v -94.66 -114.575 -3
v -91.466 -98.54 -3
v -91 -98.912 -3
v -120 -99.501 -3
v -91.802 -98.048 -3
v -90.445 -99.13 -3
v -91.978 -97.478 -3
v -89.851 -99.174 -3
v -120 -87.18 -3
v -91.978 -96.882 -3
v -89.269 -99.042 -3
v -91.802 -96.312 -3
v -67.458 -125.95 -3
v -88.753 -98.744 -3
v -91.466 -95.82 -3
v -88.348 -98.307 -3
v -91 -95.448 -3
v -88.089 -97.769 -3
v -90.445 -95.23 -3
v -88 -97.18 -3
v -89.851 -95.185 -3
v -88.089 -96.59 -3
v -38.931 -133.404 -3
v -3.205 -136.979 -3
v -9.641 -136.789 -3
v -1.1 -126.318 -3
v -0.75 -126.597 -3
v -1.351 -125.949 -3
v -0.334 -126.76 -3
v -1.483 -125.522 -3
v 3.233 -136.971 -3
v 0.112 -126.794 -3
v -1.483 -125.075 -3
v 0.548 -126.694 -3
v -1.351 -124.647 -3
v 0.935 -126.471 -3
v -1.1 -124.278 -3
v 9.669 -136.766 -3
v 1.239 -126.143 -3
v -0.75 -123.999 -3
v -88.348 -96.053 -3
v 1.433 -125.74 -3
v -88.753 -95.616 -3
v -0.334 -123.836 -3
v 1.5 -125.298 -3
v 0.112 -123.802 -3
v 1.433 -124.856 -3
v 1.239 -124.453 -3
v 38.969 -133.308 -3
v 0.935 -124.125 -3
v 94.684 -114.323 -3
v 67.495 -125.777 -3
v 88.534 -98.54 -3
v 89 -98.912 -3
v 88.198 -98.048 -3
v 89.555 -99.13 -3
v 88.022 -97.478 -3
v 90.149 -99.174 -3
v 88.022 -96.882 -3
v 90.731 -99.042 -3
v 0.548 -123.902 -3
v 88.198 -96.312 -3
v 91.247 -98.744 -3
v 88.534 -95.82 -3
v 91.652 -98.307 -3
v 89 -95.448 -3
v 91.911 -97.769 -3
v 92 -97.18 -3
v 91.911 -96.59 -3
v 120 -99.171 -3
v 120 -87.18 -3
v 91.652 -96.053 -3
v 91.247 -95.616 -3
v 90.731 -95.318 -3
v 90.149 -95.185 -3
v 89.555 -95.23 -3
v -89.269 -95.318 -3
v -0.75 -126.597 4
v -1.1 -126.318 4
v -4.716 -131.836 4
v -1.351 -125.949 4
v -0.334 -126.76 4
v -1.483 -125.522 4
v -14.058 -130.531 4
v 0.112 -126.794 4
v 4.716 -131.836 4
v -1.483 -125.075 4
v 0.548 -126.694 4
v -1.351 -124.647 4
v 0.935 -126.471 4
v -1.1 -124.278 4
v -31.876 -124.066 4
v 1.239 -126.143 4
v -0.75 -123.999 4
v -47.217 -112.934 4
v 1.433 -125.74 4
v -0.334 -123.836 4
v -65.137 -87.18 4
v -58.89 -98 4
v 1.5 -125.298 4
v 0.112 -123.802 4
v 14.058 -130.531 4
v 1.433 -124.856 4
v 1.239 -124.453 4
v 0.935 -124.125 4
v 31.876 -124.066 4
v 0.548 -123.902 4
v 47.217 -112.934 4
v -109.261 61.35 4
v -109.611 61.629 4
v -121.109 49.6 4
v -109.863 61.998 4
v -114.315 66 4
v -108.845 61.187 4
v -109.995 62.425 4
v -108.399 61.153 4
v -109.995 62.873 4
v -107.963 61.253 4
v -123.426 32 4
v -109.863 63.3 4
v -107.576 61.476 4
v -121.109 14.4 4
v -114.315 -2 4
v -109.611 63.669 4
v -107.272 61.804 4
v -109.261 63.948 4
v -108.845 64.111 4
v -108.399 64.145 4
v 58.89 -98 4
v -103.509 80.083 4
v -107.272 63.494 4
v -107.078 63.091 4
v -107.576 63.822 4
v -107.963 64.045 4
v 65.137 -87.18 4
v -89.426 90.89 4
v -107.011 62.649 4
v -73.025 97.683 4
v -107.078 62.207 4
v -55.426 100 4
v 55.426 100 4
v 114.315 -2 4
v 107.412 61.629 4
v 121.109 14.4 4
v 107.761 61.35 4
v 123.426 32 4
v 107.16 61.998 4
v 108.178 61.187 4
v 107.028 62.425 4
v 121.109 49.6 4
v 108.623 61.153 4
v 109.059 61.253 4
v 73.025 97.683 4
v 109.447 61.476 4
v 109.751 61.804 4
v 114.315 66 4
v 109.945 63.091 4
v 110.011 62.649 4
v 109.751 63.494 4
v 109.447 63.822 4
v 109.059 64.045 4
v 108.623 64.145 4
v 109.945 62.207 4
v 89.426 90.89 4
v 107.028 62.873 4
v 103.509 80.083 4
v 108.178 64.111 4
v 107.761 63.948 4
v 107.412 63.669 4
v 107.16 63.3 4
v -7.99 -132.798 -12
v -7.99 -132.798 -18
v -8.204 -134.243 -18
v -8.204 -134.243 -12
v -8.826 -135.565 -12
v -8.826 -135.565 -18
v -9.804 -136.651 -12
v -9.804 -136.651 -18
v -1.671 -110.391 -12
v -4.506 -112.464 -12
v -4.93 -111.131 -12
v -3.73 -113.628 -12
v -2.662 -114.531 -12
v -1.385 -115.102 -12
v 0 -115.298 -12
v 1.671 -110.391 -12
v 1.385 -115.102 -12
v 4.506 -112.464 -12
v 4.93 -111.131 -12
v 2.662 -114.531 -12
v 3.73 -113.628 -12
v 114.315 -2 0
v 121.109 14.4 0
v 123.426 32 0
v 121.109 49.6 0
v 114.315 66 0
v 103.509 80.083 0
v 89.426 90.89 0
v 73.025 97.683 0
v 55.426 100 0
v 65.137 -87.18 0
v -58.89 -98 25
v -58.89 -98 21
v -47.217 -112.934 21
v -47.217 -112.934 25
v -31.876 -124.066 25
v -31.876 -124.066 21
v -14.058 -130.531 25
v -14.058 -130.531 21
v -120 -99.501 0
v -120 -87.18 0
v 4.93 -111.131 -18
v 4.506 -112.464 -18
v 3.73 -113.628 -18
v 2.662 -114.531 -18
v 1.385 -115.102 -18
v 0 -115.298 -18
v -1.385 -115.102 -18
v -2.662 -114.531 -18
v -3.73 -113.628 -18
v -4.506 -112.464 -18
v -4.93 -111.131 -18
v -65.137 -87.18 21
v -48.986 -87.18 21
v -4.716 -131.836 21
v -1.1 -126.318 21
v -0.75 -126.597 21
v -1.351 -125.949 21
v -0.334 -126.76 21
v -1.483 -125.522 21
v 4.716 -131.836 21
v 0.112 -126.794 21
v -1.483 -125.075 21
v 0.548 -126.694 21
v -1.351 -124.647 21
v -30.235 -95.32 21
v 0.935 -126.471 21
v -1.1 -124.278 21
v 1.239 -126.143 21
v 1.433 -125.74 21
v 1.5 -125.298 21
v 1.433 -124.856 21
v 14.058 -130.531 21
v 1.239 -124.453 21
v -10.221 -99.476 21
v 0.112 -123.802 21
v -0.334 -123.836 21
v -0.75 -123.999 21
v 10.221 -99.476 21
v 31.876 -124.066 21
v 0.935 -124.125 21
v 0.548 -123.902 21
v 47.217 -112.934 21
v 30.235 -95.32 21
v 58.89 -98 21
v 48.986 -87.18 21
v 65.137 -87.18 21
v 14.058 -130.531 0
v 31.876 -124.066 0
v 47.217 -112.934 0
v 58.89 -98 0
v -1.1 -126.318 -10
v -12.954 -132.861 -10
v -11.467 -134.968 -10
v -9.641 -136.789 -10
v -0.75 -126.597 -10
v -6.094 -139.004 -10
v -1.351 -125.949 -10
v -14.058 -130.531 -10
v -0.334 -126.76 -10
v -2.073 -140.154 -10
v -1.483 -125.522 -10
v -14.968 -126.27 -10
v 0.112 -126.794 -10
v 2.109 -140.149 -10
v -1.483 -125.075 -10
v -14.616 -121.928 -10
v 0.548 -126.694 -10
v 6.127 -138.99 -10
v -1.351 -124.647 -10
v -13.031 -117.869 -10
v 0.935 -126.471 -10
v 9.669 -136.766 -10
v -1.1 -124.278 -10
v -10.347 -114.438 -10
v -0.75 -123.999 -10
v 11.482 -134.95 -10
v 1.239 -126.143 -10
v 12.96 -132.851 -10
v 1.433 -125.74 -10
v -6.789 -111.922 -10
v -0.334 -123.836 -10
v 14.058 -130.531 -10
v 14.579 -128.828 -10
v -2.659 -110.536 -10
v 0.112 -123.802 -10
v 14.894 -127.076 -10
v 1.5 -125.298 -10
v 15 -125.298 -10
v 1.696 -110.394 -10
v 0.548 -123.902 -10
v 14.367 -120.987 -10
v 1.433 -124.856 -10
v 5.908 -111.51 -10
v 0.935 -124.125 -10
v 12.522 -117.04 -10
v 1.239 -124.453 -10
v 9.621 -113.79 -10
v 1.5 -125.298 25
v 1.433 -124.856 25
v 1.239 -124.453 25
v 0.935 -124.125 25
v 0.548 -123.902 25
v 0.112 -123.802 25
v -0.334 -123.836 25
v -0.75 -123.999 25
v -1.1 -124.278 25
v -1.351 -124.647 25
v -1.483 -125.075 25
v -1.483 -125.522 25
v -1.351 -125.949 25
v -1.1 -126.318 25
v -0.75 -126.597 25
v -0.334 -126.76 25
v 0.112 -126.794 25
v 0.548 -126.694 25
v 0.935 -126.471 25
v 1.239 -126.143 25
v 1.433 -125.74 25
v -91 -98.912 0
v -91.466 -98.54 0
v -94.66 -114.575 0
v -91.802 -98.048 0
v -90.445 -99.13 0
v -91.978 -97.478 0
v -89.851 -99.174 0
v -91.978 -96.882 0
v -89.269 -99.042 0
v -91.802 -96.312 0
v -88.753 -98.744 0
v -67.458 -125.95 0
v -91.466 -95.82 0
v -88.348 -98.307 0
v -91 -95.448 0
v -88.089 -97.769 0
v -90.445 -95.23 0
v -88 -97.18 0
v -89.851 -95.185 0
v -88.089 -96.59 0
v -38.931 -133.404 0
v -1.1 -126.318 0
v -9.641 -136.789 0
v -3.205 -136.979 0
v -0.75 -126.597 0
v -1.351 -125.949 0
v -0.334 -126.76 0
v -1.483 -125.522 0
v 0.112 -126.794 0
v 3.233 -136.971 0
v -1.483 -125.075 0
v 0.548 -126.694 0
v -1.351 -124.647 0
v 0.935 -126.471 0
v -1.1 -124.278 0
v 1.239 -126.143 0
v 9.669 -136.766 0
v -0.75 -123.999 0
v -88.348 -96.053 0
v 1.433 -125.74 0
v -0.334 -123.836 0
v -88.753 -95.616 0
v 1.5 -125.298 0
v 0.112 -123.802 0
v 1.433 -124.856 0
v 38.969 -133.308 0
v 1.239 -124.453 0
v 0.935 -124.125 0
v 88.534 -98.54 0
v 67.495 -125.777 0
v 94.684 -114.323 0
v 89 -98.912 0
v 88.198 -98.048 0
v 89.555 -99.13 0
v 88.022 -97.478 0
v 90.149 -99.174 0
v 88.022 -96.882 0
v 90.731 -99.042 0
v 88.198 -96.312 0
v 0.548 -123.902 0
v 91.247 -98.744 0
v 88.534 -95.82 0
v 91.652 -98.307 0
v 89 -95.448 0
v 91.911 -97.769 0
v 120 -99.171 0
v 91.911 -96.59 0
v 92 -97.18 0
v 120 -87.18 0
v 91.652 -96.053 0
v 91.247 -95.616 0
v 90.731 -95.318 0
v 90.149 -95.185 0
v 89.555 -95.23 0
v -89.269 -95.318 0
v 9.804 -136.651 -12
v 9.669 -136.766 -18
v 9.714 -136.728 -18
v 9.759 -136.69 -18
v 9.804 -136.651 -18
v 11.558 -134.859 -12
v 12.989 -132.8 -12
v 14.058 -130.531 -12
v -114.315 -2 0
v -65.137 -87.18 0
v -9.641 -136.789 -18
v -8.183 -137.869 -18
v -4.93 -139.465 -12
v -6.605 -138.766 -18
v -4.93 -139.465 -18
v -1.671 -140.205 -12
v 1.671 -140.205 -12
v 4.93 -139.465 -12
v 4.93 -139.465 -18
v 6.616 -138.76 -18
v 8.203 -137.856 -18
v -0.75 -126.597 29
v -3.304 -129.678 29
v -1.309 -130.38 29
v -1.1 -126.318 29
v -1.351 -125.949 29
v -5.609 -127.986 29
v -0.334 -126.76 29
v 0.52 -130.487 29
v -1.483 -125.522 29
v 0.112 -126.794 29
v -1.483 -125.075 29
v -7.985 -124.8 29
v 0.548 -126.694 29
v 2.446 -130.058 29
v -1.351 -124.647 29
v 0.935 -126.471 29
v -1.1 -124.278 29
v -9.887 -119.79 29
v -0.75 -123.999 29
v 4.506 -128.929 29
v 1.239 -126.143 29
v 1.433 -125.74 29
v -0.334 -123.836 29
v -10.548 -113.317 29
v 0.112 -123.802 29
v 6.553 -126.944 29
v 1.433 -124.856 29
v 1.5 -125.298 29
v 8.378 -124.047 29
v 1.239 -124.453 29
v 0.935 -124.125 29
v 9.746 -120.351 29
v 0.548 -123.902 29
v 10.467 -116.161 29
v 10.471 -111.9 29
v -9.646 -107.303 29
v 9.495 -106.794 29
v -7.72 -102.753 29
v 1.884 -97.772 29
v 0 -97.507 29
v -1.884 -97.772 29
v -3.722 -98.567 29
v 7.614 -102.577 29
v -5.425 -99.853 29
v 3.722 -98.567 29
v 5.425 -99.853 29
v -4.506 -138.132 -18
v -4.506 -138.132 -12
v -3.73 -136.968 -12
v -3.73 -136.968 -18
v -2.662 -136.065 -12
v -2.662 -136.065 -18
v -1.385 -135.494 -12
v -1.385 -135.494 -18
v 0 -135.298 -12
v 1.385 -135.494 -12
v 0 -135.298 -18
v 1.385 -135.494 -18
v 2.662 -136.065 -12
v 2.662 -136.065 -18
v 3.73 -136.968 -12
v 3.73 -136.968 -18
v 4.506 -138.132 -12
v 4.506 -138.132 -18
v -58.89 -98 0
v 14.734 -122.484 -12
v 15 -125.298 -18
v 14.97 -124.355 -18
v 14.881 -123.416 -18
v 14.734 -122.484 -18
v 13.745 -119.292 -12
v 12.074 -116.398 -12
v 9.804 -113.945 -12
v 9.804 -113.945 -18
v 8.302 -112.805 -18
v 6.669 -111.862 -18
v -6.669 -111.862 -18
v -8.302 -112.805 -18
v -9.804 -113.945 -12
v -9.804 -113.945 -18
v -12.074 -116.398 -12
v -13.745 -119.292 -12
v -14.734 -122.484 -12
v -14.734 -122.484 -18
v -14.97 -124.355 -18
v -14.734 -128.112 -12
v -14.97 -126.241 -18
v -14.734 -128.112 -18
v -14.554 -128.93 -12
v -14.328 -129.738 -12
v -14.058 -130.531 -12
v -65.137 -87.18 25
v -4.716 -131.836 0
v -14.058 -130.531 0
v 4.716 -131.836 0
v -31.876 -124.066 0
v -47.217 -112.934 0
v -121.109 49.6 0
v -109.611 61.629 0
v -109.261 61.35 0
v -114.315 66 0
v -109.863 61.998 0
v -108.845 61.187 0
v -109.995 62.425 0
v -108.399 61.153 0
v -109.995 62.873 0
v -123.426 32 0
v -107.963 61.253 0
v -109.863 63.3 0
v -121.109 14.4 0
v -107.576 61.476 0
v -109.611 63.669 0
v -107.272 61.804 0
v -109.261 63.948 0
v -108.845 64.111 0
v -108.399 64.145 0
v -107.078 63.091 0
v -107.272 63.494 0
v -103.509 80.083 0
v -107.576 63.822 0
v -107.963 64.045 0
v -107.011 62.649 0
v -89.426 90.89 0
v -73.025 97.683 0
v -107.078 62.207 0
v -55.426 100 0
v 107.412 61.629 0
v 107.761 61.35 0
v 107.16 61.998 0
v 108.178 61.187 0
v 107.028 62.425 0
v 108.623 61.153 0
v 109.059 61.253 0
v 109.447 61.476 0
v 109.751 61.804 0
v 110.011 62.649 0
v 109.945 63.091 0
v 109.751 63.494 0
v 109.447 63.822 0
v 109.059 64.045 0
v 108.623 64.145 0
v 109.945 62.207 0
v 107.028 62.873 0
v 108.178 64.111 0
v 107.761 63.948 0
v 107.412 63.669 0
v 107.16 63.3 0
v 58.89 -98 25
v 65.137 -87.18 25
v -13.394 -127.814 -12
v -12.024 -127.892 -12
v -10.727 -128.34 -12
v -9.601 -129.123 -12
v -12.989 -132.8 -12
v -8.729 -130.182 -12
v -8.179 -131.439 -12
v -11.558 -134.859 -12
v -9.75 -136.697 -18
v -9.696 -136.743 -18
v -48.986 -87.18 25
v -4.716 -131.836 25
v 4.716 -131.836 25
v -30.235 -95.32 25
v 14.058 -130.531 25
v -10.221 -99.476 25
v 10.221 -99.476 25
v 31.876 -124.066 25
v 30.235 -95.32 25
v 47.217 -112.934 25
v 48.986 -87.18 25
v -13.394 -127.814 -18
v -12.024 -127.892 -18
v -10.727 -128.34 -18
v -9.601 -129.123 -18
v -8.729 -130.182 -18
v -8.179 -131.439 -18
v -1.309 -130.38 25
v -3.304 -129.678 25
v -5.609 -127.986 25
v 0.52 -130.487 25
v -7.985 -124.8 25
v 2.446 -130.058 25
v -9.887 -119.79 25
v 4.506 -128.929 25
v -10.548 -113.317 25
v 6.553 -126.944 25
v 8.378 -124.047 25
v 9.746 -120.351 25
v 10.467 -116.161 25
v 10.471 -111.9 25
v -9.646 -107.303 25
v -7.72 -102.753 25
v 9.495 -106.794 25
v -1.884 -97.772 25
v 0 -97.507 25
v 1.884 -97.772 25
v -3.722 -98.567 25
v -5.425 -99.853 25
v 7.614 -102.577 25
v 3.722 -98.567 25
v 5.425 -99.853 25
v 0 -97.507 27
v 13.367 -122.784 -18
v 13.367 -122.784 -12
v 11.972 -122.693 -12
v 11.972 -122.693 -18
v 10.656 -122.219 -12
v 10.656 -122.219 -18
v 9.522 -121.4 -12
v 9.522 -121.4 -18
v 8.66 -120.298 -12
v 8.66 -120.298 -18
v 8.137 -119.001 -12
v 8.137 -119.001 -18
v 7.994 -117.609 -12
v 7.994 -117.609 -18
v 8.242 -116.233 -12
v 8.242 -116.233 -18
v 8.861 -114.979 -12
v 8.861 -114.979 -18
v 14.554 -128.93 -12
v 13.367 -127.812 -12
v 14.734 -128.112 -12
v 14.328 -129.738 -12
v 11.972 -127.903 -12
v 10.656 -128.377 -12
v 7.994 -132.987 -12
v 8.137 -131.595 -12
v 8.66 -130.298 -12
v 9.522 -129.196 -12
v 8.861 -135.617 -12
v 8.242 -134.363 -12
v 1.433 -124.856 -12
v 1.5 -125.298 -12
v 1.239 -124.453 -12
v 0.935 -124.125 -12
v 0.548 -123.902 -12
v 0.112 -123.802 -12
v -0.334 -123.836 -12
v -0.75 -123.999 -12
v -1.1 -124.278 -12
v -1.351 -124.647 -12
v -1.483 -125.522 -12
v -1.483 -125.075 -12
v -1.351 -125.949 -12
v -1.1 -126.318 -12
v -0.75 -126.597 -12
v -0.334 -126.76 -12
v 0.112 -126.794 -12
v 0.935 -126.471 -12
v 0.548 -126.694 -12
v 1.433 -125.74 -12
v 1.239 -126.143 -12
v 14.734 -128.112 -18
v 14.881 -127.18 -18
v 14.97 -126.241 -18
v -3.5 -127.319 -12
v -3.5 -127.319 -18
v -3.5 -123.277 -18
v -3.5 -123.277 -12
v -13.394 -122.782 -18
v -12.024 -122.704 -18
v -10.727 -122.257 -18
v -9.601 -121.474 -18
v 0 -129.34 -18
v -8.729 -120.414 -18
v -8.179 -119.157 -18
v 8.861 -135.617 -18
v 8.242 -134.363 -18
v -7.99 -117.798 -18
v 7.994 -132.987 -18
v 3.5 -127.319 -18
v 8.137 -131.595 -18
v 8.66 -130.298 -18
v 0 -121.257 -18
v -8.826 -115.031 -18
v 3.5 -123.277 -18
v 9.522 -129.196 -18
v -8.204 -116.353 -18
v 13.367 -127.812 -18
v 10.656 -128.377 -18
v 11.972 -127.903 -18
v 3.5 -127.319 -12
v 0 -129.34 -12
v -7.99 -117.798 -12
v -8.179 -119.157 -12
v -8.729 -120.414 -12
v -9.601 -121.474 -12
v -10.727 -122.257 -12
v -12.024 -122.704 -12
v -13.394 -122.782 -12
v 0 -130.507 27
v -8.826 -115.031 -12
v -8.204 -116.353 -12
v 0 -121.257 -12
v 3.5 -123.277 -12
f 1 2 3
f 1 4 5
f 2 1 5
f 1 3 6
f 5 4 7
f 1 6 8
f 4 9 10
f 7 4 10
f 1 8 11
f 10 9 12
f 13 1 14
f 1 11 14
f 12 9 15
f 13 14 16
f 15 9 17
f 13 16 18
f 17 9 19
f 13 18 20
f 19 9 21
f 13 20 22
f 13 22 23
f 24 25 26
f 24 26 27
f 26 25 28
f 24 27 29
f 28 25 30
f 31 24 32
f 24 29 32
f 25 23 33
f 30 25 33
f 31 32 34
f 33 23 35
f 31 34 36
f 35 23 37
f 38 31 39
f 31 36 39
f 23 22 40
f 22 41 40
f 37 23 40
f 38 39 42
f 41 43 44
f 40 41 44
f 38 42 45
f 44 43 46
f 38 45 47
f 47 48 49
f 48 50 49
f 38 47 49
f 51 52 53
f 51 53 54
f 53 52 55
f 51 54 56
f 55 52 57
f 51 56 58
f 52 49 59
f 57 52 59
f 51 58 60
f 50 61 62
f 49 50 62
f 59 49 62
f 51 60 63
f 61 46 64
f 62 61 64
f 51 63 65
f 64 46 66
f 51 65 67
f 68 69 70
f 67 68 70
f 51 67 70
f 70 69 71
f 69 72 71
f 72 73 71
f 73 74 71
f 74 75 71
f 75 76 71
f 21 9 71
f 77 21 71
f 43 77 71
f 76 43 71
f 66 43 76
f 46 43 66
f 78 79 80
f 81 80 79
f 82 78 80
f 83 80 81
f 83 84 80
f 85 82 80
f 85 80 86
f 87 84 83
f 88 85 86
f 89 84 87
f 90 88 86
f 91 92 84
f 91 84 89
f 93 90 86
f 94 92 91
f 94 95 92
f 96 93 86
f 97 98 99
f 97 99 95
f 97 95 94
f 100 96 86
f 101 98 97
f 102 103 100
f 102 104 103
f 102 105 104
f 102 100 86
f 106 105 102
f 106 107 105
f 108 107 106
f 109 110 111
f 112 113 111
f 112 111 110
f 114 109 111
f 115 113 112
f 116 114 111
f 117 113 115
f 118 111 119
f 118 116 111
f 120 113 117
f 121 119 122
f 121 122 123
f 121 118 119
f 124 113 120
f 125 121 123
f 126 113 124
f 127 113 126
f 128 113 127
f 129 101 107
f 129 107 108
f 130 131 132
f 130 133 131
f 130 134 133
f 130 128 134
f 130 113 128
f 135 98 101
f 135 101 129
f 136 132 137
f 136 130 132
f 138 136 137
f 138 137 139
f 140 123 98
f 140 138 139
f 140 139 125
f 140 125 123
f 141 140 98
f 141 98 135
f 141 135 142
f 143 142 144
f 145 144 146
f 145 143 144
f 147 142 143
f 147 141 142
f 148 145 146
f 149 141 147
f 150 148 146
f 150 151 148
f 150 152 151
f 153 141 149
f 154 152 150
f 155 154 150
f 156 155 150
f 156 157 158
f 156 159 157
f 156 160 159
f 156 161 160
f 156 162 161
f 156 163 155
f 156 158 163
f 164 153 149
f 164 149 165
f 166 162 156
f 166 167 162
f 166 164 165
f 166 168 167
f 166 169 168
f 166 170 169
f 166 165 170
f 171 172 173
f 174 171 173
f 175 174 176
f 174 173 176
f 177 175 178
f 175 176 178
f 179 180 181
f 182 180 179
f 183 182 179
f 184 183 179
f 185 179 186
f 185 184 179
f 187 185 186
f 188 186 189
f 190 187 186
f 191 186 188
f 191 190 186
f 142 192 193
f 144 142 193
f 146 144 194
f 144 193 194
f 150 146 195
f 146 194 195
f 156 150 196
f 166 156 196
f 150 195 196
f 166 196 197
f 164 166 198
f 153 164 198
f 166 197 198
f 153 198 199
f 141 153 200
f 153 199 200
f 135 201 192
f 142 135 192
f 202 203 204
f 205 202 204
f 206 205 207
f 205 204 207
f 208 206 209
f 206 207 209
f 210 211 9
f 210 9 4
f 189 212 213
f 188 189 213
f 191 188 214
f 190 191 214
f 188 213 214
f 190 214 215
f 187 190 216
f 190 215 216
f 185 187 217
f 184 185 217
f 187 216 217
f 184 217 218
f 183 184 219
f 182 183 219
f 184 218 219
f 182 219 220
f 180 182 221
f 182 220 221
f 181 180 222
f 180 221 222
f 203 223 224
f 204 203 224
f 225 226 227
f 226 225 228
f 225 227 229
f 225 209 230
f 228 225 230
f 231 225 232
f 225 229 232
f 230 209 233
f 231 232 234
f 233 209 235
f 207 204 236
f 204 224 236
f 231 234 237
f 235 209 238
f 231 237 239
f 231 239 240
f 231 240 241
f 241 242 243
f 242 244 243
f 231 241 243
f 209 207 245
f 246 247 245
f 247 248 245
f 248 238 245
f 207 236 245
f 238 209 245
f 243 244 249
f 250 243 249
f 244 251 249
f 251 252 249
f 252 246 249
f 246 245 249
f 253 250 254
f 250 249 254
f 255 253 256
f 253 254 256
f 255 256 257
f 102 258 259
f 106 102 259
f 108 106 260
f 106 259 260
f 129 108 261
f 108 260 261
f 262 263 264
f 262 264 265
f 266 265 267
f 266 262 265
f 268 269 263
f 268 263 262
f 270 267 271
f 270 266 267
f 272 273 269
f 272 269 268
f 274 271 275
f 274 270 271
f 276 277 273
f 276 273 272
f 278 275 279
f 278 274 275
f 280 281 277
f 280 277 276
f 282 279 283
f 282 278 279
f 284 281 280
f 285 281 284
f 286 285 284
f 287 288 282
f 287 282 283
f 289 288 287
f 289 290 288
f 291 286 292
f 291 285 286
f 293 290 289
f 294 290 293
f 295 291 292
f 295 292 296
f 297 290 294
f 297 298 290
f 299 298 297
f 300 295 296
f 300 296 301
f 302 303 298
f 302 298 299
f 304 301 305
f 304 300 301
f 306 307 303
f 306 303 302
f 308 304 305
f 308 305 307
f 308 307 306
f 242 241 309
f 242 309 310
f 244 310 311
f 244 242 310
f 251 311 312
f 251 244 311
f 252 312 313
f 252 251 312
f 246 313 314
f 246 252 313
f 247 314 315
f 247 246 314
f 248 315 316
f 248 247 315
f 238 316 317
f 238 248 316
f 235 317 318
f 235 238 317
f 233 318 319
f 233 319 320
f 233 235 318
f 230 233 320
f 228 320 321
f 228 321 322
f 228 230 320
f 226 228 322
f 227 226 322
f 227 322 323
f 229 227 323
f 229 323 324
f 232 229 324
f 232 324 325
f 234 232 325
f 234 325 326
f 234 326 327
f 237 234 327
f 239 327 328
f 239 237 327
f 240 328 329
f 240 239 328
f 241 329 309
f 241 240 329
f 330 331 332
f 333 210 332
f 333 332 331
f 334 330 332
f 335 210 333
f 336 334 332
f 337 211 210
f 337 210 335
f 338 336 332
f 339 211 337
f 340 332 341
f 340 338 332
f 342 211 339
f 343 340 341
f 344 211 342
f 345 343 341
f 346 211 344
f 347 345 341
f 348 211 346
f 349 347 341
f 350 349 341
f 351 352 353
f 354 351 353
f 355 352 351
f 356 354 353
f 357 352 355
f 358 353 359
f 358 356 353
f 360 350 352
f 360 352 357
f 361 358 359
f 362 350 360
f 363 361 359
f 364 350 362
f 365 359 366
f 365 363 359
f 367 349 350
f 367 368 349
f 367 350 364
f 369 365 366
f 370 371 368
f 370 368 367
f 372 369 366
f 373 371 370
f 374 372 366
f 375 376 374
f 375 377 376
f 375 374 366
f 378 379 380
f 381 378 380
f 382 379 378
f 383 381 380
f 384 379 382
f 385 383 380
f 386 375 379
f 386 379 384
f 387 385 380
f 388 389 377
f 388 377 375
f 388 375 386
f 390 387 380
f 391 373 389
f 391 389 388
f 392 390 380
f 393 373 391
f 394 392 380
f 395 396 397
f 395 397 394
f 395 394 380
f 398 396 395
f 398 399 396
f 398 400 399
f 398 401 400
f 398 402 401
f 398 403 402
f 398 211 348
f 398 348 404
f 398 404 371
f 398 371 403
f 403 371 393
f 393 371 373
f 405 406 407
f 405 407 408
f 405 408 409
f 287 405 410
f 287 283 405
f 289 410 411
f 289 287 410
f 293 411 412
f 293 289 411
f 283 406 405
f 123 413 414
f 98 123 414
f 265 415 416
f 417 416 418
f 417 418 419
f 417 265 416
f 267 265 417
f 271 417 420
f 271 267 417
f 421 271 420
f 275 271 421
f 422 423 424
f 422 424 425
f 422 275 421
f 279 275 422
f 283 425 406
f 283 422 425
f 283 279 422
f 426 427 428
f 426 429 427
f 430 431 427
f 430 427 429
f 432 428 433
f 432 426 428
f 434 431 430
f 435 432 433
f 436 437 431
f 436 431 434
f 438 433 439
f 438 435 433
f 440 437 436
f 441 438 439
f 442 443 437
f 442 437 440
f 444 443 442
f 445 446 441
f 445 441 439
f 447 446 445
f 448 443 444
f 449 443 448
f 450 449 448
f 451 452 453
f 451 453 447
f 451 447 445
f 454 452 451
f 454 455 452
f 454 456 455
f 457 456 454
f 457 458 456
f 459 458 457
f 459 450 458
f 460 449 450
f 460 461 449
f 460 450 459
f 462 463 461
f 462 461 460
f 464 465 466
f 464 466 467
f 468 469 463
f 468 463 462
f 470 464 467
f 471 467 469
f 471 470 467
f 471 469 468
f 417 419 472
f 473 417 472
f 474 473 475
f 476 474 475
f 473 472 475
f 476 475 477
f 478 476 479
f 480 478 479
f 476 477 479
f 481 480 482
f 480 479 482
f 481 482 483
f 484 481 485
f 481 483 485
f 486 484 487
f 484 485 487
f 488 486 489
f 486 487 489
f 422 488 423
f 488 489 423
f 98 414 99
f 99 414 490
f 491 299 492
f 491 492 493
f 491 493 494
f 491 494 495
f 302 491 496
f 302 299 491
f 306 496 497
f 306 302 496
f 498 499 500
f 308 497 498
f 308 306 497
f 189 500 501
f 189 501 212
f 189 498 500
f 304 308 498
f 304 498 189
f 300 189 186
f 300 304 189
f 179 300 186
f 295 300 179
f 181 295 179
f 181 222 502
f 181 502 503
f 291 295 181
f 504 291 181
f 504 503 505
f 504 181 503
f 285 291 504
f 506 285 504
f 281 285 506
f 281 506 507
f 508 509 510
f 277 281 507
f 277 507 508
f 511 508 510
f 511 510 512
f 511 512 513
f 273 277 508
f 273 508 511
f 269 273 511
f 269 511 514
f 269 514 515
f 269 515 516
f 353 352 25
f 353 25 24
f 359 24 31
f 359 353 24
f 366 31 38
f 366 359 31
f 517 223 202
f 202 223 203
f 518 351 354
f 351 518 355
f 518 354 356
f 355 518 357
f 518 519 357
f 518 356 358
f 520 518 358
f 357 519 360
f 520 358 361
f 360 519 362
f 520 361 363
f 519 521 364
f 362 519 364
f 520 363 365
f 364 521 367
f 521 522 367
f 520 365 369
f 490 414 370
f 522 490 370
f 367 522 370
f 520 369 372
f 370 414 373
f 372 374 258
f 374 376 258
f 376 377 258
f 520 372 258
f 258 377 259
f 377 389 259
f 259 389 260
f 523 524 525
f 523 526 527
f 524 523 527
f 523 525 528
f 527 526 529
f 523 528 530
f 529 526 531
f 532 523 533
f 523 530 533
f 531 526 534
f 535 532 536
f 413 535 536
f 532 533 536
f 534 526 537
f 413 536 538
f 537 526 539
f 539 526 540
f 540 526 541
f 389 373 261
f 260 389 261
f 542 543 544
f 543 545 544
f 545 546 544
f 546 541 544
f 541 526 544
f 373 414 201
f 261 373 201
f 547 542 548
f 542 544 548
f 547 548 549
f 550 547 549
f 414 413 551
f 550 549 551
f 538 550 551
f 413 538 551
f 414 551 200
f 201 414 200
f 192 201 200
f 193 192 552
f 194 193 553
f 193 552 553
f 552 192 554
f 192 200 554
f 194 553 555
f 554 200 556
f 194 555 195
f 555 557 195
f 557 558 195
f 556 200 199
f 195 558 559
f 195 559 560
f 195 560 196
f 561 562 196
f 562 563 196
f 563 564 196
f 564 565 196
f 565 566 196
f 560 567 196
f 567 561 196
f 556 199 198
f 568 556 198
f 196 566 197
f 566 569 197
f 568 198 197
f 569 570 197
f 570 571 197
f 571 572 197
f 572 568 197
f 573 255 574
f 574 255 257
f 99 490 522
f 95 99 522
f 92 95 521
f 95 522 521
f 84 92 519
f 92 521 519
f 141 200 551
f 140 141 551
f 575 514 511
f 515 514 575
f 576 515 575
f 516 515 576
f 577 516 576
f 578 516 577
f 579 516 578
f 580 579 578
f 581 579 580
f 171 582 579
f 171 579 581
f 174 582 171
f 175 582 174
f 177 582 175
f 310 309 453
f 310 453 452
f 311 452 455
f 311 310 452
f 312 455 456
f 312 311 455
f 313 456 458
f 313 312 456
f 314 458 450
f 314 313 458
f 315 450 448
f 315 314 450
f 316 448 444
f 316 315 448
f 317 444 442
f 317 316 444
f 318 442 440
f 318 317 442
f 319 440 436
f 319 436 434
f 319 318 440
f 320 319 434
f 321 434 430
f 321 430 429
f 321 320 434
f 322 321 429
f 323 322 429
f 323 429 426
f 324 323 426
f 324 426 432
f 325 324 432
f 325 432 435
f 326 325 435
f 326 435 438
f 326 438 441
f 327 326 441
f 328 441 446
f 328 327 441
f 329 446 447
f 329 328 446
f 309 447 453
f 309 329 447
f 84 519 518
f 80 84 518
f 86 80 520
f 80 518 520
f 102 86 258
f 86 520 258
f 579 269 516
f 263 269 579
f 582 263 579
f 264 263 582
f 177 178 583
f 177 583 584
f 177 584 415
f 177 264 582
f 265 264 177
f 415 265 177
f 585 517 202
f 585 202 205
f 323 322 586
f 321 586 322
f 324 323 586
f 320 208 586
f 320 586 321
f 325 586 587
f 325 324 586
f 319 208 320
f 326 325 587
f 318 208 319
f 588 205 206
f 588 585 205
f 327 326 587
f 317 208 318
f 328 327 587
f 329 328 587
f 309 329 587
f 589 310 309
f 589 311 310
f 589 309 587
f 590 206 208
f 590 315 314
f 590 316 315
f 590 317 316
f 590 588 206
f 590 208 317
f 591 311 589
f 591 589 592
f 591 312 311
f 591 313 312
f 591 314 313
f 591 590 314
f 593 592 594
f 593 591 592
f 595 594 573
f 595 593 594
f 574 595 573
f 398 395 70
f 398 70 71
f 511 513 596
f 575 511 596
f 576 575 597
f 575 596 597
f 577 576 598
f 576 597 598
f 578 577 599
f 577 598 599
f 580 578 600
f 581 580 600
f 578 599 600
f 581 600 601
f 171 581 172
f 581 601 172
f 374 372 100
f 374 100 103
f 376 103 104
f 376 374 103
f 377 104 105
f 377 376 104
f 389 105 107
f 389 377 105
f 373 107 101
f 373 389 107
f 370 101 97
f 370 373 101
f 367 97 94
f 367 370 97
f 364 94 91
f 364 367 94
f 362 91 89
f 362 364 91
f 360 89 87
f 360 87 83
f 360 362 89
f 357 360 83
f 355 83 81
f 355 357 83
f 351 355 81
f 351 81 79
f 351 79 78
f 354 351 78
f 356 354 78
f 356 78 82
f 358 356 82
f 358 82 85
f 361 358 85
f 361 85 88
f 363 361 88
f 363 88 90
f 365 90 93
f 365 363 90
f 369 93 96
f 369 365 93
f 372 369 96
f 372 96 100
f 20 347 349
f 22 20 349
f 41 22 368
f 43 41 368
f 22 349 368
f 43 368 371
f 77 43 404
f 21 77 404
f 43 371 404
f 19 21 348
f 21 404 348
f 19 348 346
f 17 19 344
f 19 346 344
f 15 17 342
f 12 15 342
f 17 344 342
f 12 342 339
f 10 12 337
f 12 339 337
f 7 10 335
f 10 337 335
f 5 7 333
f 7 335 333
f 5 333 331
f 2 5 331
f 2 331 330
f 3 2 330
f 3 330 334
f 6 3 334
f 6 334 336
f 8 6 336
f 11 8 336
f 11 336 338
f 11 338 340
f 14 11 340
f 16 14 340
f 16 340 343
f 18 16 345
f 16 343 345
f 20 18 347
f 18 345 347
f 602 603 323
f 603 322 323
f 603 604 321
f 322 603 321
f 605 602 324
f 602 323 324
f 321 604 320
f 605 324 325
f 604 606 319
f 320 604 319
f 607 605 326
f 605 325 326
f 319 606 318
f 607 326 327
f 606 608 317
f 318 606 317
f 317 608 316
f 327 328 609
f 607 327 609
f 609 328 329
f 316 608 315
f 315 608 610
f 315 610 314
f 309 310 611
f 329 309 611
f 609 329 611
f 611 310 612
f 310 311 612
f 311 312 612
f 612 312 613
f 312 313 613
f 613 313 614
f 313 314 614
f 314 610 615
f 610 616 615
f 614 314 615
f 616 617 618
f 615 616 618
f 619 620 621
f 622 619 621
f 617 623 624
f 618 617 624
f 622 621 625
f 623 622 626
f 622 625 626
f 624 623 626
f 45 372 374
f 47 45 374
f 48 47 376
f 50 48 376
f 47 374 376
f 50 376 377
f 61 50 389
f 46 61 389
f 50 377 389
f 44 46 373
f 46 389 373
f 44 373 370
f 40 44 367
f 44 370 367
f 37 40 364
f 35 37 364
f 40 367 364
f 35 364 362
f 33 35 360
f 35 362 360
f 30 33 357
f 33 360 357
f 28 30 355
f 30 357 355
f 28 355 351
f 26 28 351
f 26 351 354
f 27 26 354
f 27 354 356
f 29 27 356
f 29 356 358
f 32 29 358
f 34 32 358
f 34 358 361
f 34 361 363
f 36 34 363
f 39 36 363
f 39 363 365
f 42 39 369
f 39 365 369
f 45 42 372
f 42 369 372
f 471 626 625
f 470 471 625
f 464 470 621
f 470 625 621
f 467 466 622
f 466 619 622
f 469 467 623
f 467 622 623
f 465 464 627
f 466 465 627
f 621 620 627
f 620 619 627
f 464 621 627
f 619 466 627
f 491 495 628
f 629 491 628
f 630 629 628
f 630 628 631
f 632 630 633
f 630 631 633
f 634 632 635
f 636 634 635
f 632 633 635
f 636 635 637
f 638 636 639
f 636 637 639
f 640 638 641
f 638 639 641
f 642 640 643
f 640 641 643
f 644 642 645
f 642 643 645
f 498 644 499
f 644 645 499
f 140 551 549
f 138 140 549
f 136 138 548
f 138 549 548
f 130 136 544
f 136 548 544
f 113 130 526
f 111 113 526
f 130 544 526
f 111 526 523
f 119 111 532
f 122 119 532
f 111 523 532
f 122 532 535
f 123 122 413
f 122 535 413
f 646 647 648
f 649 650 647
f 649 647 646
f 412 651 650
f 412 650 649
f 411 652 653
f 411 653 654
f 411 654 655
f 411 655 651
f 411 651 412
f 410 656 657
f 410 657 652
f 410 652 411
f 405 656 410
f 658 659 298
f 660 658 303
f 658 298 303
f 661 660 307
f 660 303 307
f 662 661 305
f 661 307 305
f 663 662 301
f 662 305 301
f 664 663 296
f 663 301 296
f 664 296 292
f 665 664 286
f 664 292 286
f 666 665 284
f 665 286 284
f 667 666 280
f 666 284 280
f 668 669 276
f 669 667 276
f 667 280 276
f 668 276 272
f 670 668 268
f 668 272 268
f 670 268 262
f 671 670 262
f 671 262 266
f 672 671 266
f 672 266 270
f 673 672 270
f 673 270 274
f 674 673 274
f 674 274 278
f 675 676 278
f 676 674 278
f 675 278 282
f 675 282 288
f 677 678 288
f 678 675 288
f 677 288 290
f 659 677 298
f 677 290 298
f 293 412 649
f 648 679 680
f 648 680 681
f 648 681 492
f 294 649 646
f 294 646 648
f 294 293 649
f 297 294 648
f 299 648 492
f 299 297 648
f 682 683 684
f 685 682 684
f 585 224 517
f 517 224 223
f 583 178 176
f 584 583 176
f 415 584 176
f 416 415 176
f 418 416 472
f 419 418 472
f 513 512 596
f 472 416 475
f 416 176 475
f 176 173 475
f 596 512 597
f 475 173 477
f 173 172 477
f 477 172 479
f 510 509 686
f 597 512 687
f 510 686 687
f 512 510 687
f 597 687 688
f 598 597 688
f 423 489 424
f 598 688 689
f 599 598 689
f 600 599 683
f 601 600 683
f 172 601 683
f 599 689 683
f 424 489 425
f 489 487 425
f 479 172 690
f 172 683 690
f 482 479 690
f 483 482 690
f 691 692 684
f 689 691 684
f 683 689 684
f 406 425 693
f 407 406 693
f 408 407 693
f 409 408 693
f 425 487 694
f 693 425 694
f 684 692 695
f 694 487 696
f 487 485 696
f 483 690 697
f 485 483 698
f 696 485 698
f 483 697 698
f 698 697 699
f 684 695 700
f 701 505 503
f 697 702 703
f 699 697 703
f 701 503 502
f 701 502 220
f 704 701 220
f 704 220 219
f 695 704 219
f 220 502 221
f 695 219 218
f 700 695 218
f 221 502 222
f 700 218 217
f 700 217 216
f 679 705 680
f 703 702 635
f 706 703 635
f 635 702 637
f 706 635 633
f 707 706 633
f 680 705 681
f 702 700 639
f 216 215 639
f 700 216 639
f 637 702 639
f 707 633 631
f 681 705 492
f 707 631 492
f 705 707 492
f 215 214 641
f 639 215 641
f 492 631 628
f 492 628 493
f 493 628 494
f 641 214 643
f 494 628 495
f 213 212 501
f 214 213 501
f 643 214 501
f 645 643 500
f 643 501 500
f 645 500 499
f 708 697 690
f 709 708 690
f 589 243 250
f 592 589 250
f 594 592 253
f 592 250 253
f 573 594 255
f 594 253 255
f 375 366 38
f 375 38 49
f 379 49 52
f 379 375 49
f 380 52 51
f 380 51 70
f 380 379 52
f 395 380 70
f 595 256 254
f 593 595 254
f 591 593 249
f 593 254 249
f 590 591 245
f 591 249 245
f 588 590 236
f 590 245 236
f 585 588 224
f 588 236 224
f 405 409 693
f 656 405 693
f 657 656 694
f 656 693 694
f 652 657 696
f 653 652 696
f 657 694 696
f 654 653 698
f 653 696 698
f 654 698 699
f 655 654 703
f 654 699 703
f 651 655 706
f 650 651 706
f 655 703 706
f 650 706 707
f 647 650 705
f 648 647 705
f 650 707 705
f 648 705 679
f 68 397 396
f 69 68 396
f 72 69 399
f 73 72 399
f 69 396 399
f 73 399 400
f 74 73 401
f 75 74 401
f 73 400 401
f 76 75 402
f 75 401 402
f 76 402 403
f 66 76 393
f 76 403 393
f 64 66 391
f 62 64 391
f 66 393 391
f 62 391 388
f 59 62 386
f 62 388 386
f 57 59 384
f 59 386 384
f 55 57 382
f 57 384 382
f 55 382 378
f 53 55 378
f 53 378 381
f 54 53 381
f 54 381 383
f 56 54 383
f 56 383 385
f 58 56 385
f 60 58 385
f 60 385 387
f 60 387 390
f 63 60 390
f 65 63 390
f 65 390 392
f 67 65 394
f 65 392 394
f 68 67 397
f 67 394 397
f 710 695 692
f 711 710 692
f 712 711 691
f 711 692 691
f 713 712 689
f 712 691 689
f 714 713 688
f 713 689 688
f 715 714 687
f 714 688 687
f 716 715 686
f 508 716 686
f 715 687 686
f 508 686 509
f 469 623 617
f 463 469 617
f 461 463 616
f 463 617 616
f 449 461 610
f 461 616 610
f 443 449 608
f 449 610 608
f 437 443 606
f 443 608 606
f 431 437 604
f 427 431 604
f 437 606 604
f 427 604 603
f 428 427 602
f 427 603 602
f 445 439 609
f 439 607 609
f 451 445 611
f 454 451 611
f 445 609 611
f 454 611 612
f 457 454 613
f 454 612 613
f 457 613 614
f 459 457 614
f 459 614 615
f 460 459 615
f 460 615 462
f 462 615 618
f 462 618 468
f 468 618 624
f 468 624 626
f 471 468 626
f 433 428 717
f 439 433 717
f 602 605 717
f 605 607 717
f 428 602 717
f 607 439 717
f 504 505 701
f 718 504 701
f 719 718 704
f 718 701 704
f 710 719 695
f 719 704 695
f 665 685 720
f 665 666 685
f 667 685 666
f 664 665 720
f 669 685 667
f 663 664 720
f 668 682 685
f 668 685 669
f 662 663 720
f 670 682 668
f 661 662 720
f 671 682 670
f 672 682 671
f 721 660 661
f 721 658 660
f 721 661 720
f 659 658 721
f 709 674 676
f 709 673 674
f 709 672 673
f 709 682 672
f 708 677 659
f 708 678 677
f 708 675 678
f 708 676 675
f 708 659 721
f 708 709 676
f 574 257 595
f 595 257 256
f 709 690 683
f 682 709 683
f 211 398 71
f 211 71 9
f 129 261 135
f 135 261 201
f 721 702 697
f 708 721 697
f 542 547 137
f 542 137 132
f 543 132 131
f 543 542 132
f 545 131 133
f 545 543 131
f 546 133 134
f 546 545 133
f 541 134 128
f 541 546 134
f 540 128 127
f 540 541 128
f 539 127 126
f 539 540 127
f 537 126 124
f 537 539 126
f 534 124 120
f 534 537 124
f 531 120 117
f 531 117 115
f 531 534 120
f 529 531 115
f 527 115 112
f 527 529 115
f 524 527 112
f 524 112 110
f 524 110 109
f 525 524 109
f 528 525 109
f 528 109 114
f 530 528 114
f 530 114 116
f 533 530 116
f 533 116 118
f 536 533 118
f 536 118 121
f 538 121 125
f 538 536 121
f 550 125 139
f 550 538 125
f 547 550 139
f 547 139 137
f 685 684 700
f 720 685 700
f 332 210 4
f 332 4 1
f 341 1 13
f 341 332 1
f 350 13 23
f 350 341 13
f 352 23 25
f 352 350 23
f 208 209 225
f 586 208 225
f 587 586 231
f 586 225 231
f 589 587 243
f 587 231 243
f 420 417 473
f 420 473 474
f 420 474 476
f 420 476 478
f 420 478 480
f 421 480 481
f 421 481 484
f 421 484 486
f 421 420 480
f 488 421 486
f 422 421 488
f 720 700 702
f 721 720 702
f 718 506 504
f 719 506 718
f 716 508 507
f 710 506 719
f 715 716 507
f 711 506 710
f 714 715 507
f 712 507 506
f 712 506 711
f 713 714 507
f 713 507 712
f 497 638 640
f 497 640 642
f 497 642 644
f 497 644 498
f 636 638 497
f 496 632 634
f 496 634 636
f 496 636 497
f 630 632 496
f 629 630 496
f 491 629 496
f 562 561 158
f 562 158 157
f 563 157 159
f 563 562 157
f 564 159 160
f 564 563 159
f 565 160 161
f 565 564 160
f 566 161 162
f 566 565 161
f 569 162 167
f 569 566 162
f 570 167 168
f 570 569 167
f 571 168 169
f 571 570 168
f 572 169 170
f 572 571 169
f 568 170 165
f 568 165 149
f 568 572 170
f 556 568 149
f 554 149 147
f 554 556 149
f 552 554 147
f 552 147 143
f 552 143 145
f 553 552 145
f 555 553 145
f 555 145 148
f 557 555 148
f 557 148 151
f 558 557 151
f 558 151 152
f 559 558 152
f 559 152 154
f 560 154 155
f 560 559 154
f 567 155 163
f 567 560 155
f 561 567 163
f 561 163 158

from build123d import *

# Parameters (mm, degrees)
F0_R     = 1.5
F1_DEPTH = 4
F0_R_2   = 2
F2_DEPTH = 3
F3_START = -10
F3_DEPTH = 8
F4_R     = 1.5
F5_DEPTH = 6
F6_START = 21
F6_DEPTH = 4
F7_R     = 1.5
F8_DEPTH = 4


with BuildPart() as f1:
    # F0 (on Top) → F1 (new body)
    with BuildSketch(Plane.XY):
        with BuildLine():
            ThreePointArc((14.9999983029, -125.2980828285), (-2.6585899749, -110.535565822), (-14.0575894796, -130.5310767839))
            ThreePointArc((-14.0575894796, -130.5310767839), (-1.8826e-06, -132), (14.0575857957, -130.5310775623))
            ThreePointArc((14.0575857957, -130.5310775623), (14.7625152359, -127.9566715151), (14.9999983029, -125.2980828285))
        make_face()
        with Locations((-1.6971e-06, -125.2980828285)):
            Circle(F0_R, mode=Mode.SUBTRACT)
        with BuildLine():
            Line((-48.9863926684, -87.1798906476), (-65.1367205046, -87.1798906476))
            Line((-65.1367205046, -87.1798906476), (-58.8897274573, -98))
            ThreePointArc((-58.8897274573, -98), (-39.9361427939, -119.0373009762), (-14.0575894796, -130.5310767839))
            ThreePointArc((-14.0575894796, -130.5310767839), (-2.6585899749, -110.535565822), (14.9999983029, -125.2980828285))
            ThreePointArc((14.9999983029, -125.2980828285), (14.7625152359, -127.9566715151), (14.0575857957, -130.5310775623))
            ThreePointArc((14.0575857957, -130.5310775623), (39.9361412701, -119.0373020819), (58.8897274573, -98))
            Line((58.8897274573, -98), (65.1367205046, -87.1798906476))
            Line((65.1367205046, -87.1798906476), (48.9863926684, -87.1798906476))
            ThreePointArc((48.9863926684, -87.1798906476), (0, -100), (-48.9863926684, -87.1798906476))
        make_face()
        with BuildLine():
            Line((-114.3153532995, -2), (-86.6025397374, -50.0000011103))
            ThreePointArc((-86.6025397374, -50.0000011103), (-86.6025407137, 49.9999994193), (-5.89e-08, 100))
            Line((-5.89e-08, 100), (-55.4256258422, 100))
            ThreePointArc((-55.4256258422, 100), (-114.3153532995, 66), (-114.3153532995, -2))
        make_face()
        with Locations((-108.5113219264, 62.649042884)):
            Circle(F0_R, mode=Mode.SUBTRACT)
        with BuildLine():
            Line((55.4256258422, 100), (-5.89e-08, 100))
            ThreePointArc((-5.89e-08, 100), (70.7106780978, 70.7106781395), (100, 0))
            ThreePointArc((100, 0), (96.5925823782, -25.881905446), (86.6025394097, -50.0000016779))
            Line((86.6025394097, -50.0000016779), (114.3153532995, -2))
            ThreePointArc((114.3153532995, -2), (114.3153532995, 66), (55.4256258422, 100))
        make_face()
        with Locations((108.5113236235, 62.6490399445)):
            Circle(F0_R, mode=Mode.SUBTRACT)
        with BuildLine():
            Line((-86.6025397374, -50.0000011103), (-65.1367205046, -87.1798906476))
            Line((-65.1367205046, -87.1798906476), (-48.9863926684, -87.1798906476))
            ThreePointArc((-48.9863926684, -87.1798906476), (-70.2970532401, -71.1218975124), (-86.6025397374, -50.0000011103))
        make_face()
        with BuildLine():
            ThreePointArc((-86.6025397374, -50.0000011103), (-70.2970532401, -71.1218975124), (-48.9863926684, -87.1798906476))
            Line((-48.9863926684, -87.1798906476), (48.9863926684, -87.1798906476))
            ThreePointArc((48.9863926684, -87.1798906476), (70.2970530071, -71.1218977427), (86.6025394097, -50.0000016779))
            ThreePointArc((86.6025394097, -50.0000016779), (96.5925823782, -25.881905446), (100, 0))
            ThreePointArc((100, 0), (70.7106780978, 70.7106781395), (-5.89e-08, 100))
            ThreePointArc((-5.89e-08, 100), (-86.6025407137, 49.9999994193), (-86.6025397374, -50.0000011103))
        make_face()
        with BuildLine():
            Line((48.9863926684, -87.1798906476), (-48.9863926684, -87.1798906476))
            ThreePointArc((-48.9863926684, -87.1798906476), (0, -100), (48.9863926684, -87.1798906476))
        make_face()
        with BuildLine():
            ThreePointArc((86.6025394097, -50.0000016779), (70.2970530071, -71.1218977427), (48.9863926684, -87.1798906476))
            Line((48.9863926684, -87.1798906476), (65.1367205046, -87.1798906476))
            Line((65.1367205046, -87.1798906476), (86.6025394097, -50.0000016779))
        make_face()
    extrude(amount=F1_DEPTH)


with BuildPart() as f2:
    # F0 (on Top) → F2 (new body)
    with BuildSketch(Plane.XY):
        with BuildLine():
            Line((-65.1367205046, -87.1798906476), (-120.0000016971, -87.1798906476))
            Line((-120.0000016971, -87.1798906476), (-120.0000016971, -99.5014946908))
            ThreePointArc((-120.0000016971, -99.5014946908), (-67.4578593153, -125.9504598013), (-9.6413594448, -136.7891324229))
            ThreePointArc((-9.6413594448, -136.7891324229), (-12.2556461072, -133.946734752), (-14.0575894796, -130.5310767839))
            ThreePointArc((-14.0575894796, -130.5310767839), (-39.9361427939, -119.0373009762), (-58.8897274573, -98))
            Line((-58.8897274573, -98), (-65.1367205046, -87.1798906476))
        make_face()
        with Locations((-90.0000016971, -97.1798906476)):
            Circle(F0_R_2, mode=Mode.SUBTRACT)
        with BuildLine():
            Line((-48.9863926684, -87.1798906476), (-65.1367205046, -87.1798906476))
            Line((-65.1367205046, -87.1798906476), (-58.8897274573, -98))
            ThreePointArc((-58.8897274573, -98), (-39.9361427939, -119.0373009762), (-14.0575894796, -130.5310767839))
            ThreePointArc((-14.0575894796, -130.5310767839), (-2.6585899749, -110.535565822), (14.9999983029, -125.2980828285))
            ThreePointArc((14.9999983029, -125.2980828285), (14.7625152359, -127.9566715151), (14.0575857957, -130.5310775623))
            ThreePointArc((14.0575857957, -130.5310775623), (39.9361412701, -119.0373020819), (58.8897274573, -98))
            Line((58.8897274573, -98), (65.1367205046, -87.1798906476))
            Line((65.1367205046, -87.1798906476), (48.9863926684, -87.1798906476))
            ThreePointArc((48.9863926684, -87.1798906476), (0, -100), (-48.9863926684, -87.1798906476))
        make_face()
        with BuildLine():
            ThreePointArc((14.9999983029, -125.2980828285), (-2.6585899749, -110.535565822), (-14.0575894796, -130.5310767839))
            ThreePointArc((-14.0575894796, -130.5310767839), (-1.8826e-06, -132), (14.0575857957, -130.5310775623))
            ThreePointArc((14.0575857957, -130.5310775623), (14.7625152359, -127.9566715151), (14.9999983029, -125.2980828285))
        make_face()
        with Locations((-1.6971e-06, -125.2980828285)):
            Circle(F0_R, mode=Mode.SUBTRACT)
        with BuildLine():
            ThreePointArc((14.0575857957, -130.5310775623), (12.2659714734, -133.9320797119), (9.6687990395, -136.7660509273))
            ThreePointArc((9.6687990395, -136.7660509273), (67.4950168504, -125.7769999545), (119.9999983029, -99.1714059888))
            Line((119.9999983029, -99.1714059888), (119.9999983029, -87.1798906476))
            Line((119.9999983029, -87.1798906476), (65.1367205046, -87.1798906476))
            Line((65.1367205046, -87.1798906476), (58.8897274573, -98))
            ThreePointArc((58.8897274573, -98), (39.9361412701, -119.0373020819), (14.0575857957, -130.5310775623))
        make_face()
        with Locations((89.9999983029, -97.1798906476)):
            Circle(F0_R_2, mode=Mode.SUBTRACT)
        with BuildLine():
            Line((48.9863926684, -87.1798906476), (-48.9863926684, -87.1798906476))
            ThreePointArc((-48.9863926684, -87.1798906476), (0, -100), (48.9863926684, -87.1798906476))
        make_face()
        with BuildLine():
            ThreePointArc((-14.0575894796, -130.5310767839), (-12.2556461072, -133.946734752), (-9.6413594448, -136.7891324229))
            ThreePointArc((-9.6413594448, -136.7891324229), (0.0139852399, -136.9996629548), (9.6687990395, -136.7660509273))
            ThreePointArc((9.6687990395, -136.7660509273), (12.2659714734, -133.9320797119), (14.0575857957, -130.5310775623))
            ThreePointArc((14.0575857957, -130.5310775623), (-1.8826e-06, -132), (-14.0575894796, -130.5310767839))
        make_face()
    extrude(amount=-F2_DEPTH)


with BuildPart() as f3:
    # F0 (on Top) → F3 (new body)
    with BuildSketch(Plane.XY.offset(F3_START)):
        with BuildLine():
            ThreePointArc((14.9999983029, -125.2980828285), (-2.6585899749, -110.535565822), (-14.0575894796, -130.5310767839))
            ThreePointArc((-14.0575894796, -130.5310767839), (-1.8826e-06, -132), (14.0575857957, -130.5310775623))
            ThreePointArc((14.0575857957, -130.5310775623), (14.7625152359, -127.9566715151), (14.9999983029, -125.2980828285))
        make_face()
        with Locations((-1.6971e-06, -125.2980828285)):
            Circle(F0_R, mode=Mode.SUBTRACT)
        with BuildLine():
            ThreePointArc((-14.0575894796, -130.5310767839), (-12.2556461072, -133.946734752), (-9.6413594448, -136.7891324229))
            ThreePointArc((-9.6413594448, -136.7891324229), (0.0139852399, -136.9996629548), (9.6687990395, -136.7660509273))
            ThreePointArc((9.6687990395, -136.7660509273), (12.2659714734, -133.9320797119), (14.0575857957, -130.5310775623))
            ThreePointArc((14.0575857957, -130.5310775623), (-1.8826e-06, -132), (-14.0575894796, -130.5310767839))
        make_face()
        with BuildLine():
            ThreePointArc((9.6687990395, -136.7660509273), (0.0139852399, -136.9996629548), (-9.6413594448, -136.7891324229))
            ThreePointArc((-9.6413594448, -136.7891324229), (0.0179278392, -140.2980721129), (9.6687990395, -136.7660509273))
        make_face()
    extrude(amount=-F3_DEPTH)

    # F4 (on face) → F5 (cut)
    with BuildSketch(Plane(origin=(0, 0, -18), x_dir=(1, 0, 0), z_dir=(0, 0, -1))):
        with BuildLine():
            ThreePointArc((4.9300663916, 139.4647489374), (0, 140.2980828285), (-4.9300665802, 139.464750053))
            ThreePointArc((-4.9300665802, 139.464750053), (-5.657e-07, 135.2980828285), (4.9300663916, 139.4647489374))
        make_face()
        with BuildLine():
            ThreePointArc((-14.733727842, 128.1118550097), (-12.9903819053, 132.7980842982), (-9.80366039, 136.6509800902))
            ThreePointArc((-9.80366039, 136.6509800902), (-17.3205086414, 135.2980847882), (-14.733727842, 128.1118550097))
        make_face()
        with BuildLine():
            ThreePointArc((-7.9903819053, 132.7980842982), (-8.4663567298, 134.9272146868), (-9.80366039, 136.6509800902))
            ThreePointArc((-9.80366039, 136.6509800902), (-12.9903819053, 132.7980842982), (-14.733727842, 128.1118550097))
            ThreePointArc((-14.733727842, 128.1118550097), (-10.1370268348, 128.6921903832), (-7.9903819053, 132.7980842982))
        make_face()
        with BuildLine():
            ThreePointArc((14.7337250845, 128.1118516757), (12.9903802082, 132.7980813588), (9.8036595647, 136.6509778718))
            ThreePointArc((9.8036595647, 136.6509778718), (8.6602529064, 130.2980818487), (14.7337250845, 128.1118516757))
        make_face()
        with BuildLine():
            ThreePointArc((17.9903802082, 132.7980813588), (15.1195111087, 137.3221062934), (9.8036595647, 136.6509778718))
            ThreePointArc((9.8036595647, 136.6509778718), (12.9903802082, 132.7980813588), (14.7337250845, 128.1118516757))
            ThreePointArc((14.7337250845, 128.1118516757), (17.0962738004, 129.9447258238), (17.9903802082, 132.7980813588))
        make_face()
        with BuildLine():
            ThreePointArc((-7.9903836024, 117.7980842982), (-10.1370280674, 121.9039778905), (-14.7337284787, 122.4843139813))
            ThreePointArc((-14.7337284787, 122.4843139813), (-12.9903836024, 117.7980842982), (-9.8036629589, 113.9451877852))
            ThreePointArc((-9.8036629589, 113.9451877852), (-8.4663586678, 115.6689533978), (-7.9903836024, 117.7980842982))
        make_face()
        with BuildLine():
            ThreePointArc((9.8036569958, 113.9451855669), (12.9903785111, 117.7980813588), (14.7337244478, 122.4843106474))
            ThreePointArc((14.7337244478, 122.4843106474), (8.6602517751, 120.2980818487), (9.8036569958, 113.9451855669))
        make_face()
        with BuildLine():
            ThreePointArc((4.930063186, 111.1314156041), (-2.8285e-06, 115.2980828285), (-4.9300697858, 111.1314167196))
            ThreePointArc((-4.9300697858, 111.1314167196), (-3.3942e-06, 110.2980828285), (4.930063186, 111.1314156041))
        make_face()
        Polygon((3.4999983029, 123.2773568864), (3.4999983029, 127.3188087707), (-1.6971e-06, 129.3395347128), (-3.5000016971, 127.3188087707), (-3.5000016971, 123.2773568864), (-1.6971e-06, 121.2566309442), align=None)
        with Locations((-1.6971e-06, 125.2980828285)):
            Circle(F4_R, mode=Mode.SUBTRACT)
    extrude(amount=-F5_DEPTH, mode=Mode.SUBTRACT)


with BuildPart() as f6:
    # F0 (on Top) → F6 (new body)
    with BuildSketch(Plane.XY.offset(F6_START)):
        with BuildLine():
            ThreePointArc((14.9999983029, -125.2980828285), (-2.6585899749, -110.535565822), (-14.0575894796, -130.5310767839))
            ThreePointArc((-14.0575894796, -130.5310767839), (-1.8826e-06, -132), (14.0575857957, -130.5310775623))
            ThreePointArc((14.0575857957, -130.5310775623), (14.7625152359, -127.9566715151), (14.9999983029, -125.2980828285))
        make_face()
        with Locations((-1.6971e-06, -125.2980828285)):
            Circle(F0_R, mode=Mode.SUBTRACT)
        with BuildLine():
            Line((-48.9863926684, -87.1798906476), (-65.1367205046, -87.1798906476))
            Line((-65.1367205046, -87.1798906476), (-58.8897274573, -98))
            ThreePointArc((-58.8897274573, -98), (-39.9361427939, -119.0373009762), (-14.0575894796, -130.5310767839))
            ThreePointArc((-14.0575894796, -130.5310767839), (-2.6585899749, -110.535565822), (14.9999983029, -125.2980828285))
            ThreePointArc((14.9999983029, -125.2980828285), (14.7625152359, -127.9566715151), (14.0575857957, -130.5310775623))
            ThreePointArc((14.0575857957, -130.5310775623), (39.9361412701, -119.0373020819), (58.8897274573, -98))
            Line((58.8897274573, -98), (65.1367205046, -87.1798906476))
            Line((65.1367205046, -87.1798906476), (48.9863926684, -87.1798906476))
            ThreePointArc((48.9863926684, -87.1798906476), (0, -100), (-48.9863926684, -87.1798906476))
        make_face()
    extrude(amount=F6_DEPTH)


with BuildPart() as f8:
    # F7 (on face) → F8 (new body)
    with BuildSketch(Plane.XY.offset(25)):
        with BuildLine():
            ThreePointArc((5.4254401673, -99.8527145299), (0, -100), (-5.4254401673, -99.8527145299))
            add(Edge.make_bspline(
                [(-5.4254401673, -99.8527145299), (-38.1652299211, -130.5071302652), (0, -130.5071302652), (38.1652299211, -130.5071302652), (5.4254401673, -99.8527145299)],
                knots=[0.5397379565, 0.5397379565, 0.5397379565, 3.1415926536, 3.1415926536, 5.7434473507, 5.7434473507, 5.7434473507], degree=2, weights=[1, 0.2666051595, 1, 0.2666051595, 1]))
        make_face()
        with Locations((-1.6971e-06, -125.2980828285)):
            Circle(F7_R, mode=Mode.SUBTRACT)
        with BuildLine():
            add(Edge.make_bspline(
                [(5.4254401673, -99.8527145299), (2.920289316, -97.5071302652), (0, -97.5071302652)],
                knots=[5.7434473507, 5.7434473507, 5.7434473507, 6.2831853072, 6.2831853072, 6.2831853072], degree=2, weights=[1, 0.9638058357, 1]))
            add(Edge.make_bspline(
                [(0, -97.5071302652), (-2.920289316, -97.5071302652), (-5.4254401673, -99.8527145299)],
                knots=[0, 0, 0, 0.5397379565, 0.5397379565, 0.5397379565], degree=2, weights=[1, 0.9638058357, 1]))
            ThreePointArc((-5.4254401673, -99.8527145299), (0, -100), (5.4254401673, -99.8527145299))
        make_face()
    extrude(amount=F8_DEPTH)


solid = Compound([f1.part, f2.part, f3.part, f6.part, f8.part])
